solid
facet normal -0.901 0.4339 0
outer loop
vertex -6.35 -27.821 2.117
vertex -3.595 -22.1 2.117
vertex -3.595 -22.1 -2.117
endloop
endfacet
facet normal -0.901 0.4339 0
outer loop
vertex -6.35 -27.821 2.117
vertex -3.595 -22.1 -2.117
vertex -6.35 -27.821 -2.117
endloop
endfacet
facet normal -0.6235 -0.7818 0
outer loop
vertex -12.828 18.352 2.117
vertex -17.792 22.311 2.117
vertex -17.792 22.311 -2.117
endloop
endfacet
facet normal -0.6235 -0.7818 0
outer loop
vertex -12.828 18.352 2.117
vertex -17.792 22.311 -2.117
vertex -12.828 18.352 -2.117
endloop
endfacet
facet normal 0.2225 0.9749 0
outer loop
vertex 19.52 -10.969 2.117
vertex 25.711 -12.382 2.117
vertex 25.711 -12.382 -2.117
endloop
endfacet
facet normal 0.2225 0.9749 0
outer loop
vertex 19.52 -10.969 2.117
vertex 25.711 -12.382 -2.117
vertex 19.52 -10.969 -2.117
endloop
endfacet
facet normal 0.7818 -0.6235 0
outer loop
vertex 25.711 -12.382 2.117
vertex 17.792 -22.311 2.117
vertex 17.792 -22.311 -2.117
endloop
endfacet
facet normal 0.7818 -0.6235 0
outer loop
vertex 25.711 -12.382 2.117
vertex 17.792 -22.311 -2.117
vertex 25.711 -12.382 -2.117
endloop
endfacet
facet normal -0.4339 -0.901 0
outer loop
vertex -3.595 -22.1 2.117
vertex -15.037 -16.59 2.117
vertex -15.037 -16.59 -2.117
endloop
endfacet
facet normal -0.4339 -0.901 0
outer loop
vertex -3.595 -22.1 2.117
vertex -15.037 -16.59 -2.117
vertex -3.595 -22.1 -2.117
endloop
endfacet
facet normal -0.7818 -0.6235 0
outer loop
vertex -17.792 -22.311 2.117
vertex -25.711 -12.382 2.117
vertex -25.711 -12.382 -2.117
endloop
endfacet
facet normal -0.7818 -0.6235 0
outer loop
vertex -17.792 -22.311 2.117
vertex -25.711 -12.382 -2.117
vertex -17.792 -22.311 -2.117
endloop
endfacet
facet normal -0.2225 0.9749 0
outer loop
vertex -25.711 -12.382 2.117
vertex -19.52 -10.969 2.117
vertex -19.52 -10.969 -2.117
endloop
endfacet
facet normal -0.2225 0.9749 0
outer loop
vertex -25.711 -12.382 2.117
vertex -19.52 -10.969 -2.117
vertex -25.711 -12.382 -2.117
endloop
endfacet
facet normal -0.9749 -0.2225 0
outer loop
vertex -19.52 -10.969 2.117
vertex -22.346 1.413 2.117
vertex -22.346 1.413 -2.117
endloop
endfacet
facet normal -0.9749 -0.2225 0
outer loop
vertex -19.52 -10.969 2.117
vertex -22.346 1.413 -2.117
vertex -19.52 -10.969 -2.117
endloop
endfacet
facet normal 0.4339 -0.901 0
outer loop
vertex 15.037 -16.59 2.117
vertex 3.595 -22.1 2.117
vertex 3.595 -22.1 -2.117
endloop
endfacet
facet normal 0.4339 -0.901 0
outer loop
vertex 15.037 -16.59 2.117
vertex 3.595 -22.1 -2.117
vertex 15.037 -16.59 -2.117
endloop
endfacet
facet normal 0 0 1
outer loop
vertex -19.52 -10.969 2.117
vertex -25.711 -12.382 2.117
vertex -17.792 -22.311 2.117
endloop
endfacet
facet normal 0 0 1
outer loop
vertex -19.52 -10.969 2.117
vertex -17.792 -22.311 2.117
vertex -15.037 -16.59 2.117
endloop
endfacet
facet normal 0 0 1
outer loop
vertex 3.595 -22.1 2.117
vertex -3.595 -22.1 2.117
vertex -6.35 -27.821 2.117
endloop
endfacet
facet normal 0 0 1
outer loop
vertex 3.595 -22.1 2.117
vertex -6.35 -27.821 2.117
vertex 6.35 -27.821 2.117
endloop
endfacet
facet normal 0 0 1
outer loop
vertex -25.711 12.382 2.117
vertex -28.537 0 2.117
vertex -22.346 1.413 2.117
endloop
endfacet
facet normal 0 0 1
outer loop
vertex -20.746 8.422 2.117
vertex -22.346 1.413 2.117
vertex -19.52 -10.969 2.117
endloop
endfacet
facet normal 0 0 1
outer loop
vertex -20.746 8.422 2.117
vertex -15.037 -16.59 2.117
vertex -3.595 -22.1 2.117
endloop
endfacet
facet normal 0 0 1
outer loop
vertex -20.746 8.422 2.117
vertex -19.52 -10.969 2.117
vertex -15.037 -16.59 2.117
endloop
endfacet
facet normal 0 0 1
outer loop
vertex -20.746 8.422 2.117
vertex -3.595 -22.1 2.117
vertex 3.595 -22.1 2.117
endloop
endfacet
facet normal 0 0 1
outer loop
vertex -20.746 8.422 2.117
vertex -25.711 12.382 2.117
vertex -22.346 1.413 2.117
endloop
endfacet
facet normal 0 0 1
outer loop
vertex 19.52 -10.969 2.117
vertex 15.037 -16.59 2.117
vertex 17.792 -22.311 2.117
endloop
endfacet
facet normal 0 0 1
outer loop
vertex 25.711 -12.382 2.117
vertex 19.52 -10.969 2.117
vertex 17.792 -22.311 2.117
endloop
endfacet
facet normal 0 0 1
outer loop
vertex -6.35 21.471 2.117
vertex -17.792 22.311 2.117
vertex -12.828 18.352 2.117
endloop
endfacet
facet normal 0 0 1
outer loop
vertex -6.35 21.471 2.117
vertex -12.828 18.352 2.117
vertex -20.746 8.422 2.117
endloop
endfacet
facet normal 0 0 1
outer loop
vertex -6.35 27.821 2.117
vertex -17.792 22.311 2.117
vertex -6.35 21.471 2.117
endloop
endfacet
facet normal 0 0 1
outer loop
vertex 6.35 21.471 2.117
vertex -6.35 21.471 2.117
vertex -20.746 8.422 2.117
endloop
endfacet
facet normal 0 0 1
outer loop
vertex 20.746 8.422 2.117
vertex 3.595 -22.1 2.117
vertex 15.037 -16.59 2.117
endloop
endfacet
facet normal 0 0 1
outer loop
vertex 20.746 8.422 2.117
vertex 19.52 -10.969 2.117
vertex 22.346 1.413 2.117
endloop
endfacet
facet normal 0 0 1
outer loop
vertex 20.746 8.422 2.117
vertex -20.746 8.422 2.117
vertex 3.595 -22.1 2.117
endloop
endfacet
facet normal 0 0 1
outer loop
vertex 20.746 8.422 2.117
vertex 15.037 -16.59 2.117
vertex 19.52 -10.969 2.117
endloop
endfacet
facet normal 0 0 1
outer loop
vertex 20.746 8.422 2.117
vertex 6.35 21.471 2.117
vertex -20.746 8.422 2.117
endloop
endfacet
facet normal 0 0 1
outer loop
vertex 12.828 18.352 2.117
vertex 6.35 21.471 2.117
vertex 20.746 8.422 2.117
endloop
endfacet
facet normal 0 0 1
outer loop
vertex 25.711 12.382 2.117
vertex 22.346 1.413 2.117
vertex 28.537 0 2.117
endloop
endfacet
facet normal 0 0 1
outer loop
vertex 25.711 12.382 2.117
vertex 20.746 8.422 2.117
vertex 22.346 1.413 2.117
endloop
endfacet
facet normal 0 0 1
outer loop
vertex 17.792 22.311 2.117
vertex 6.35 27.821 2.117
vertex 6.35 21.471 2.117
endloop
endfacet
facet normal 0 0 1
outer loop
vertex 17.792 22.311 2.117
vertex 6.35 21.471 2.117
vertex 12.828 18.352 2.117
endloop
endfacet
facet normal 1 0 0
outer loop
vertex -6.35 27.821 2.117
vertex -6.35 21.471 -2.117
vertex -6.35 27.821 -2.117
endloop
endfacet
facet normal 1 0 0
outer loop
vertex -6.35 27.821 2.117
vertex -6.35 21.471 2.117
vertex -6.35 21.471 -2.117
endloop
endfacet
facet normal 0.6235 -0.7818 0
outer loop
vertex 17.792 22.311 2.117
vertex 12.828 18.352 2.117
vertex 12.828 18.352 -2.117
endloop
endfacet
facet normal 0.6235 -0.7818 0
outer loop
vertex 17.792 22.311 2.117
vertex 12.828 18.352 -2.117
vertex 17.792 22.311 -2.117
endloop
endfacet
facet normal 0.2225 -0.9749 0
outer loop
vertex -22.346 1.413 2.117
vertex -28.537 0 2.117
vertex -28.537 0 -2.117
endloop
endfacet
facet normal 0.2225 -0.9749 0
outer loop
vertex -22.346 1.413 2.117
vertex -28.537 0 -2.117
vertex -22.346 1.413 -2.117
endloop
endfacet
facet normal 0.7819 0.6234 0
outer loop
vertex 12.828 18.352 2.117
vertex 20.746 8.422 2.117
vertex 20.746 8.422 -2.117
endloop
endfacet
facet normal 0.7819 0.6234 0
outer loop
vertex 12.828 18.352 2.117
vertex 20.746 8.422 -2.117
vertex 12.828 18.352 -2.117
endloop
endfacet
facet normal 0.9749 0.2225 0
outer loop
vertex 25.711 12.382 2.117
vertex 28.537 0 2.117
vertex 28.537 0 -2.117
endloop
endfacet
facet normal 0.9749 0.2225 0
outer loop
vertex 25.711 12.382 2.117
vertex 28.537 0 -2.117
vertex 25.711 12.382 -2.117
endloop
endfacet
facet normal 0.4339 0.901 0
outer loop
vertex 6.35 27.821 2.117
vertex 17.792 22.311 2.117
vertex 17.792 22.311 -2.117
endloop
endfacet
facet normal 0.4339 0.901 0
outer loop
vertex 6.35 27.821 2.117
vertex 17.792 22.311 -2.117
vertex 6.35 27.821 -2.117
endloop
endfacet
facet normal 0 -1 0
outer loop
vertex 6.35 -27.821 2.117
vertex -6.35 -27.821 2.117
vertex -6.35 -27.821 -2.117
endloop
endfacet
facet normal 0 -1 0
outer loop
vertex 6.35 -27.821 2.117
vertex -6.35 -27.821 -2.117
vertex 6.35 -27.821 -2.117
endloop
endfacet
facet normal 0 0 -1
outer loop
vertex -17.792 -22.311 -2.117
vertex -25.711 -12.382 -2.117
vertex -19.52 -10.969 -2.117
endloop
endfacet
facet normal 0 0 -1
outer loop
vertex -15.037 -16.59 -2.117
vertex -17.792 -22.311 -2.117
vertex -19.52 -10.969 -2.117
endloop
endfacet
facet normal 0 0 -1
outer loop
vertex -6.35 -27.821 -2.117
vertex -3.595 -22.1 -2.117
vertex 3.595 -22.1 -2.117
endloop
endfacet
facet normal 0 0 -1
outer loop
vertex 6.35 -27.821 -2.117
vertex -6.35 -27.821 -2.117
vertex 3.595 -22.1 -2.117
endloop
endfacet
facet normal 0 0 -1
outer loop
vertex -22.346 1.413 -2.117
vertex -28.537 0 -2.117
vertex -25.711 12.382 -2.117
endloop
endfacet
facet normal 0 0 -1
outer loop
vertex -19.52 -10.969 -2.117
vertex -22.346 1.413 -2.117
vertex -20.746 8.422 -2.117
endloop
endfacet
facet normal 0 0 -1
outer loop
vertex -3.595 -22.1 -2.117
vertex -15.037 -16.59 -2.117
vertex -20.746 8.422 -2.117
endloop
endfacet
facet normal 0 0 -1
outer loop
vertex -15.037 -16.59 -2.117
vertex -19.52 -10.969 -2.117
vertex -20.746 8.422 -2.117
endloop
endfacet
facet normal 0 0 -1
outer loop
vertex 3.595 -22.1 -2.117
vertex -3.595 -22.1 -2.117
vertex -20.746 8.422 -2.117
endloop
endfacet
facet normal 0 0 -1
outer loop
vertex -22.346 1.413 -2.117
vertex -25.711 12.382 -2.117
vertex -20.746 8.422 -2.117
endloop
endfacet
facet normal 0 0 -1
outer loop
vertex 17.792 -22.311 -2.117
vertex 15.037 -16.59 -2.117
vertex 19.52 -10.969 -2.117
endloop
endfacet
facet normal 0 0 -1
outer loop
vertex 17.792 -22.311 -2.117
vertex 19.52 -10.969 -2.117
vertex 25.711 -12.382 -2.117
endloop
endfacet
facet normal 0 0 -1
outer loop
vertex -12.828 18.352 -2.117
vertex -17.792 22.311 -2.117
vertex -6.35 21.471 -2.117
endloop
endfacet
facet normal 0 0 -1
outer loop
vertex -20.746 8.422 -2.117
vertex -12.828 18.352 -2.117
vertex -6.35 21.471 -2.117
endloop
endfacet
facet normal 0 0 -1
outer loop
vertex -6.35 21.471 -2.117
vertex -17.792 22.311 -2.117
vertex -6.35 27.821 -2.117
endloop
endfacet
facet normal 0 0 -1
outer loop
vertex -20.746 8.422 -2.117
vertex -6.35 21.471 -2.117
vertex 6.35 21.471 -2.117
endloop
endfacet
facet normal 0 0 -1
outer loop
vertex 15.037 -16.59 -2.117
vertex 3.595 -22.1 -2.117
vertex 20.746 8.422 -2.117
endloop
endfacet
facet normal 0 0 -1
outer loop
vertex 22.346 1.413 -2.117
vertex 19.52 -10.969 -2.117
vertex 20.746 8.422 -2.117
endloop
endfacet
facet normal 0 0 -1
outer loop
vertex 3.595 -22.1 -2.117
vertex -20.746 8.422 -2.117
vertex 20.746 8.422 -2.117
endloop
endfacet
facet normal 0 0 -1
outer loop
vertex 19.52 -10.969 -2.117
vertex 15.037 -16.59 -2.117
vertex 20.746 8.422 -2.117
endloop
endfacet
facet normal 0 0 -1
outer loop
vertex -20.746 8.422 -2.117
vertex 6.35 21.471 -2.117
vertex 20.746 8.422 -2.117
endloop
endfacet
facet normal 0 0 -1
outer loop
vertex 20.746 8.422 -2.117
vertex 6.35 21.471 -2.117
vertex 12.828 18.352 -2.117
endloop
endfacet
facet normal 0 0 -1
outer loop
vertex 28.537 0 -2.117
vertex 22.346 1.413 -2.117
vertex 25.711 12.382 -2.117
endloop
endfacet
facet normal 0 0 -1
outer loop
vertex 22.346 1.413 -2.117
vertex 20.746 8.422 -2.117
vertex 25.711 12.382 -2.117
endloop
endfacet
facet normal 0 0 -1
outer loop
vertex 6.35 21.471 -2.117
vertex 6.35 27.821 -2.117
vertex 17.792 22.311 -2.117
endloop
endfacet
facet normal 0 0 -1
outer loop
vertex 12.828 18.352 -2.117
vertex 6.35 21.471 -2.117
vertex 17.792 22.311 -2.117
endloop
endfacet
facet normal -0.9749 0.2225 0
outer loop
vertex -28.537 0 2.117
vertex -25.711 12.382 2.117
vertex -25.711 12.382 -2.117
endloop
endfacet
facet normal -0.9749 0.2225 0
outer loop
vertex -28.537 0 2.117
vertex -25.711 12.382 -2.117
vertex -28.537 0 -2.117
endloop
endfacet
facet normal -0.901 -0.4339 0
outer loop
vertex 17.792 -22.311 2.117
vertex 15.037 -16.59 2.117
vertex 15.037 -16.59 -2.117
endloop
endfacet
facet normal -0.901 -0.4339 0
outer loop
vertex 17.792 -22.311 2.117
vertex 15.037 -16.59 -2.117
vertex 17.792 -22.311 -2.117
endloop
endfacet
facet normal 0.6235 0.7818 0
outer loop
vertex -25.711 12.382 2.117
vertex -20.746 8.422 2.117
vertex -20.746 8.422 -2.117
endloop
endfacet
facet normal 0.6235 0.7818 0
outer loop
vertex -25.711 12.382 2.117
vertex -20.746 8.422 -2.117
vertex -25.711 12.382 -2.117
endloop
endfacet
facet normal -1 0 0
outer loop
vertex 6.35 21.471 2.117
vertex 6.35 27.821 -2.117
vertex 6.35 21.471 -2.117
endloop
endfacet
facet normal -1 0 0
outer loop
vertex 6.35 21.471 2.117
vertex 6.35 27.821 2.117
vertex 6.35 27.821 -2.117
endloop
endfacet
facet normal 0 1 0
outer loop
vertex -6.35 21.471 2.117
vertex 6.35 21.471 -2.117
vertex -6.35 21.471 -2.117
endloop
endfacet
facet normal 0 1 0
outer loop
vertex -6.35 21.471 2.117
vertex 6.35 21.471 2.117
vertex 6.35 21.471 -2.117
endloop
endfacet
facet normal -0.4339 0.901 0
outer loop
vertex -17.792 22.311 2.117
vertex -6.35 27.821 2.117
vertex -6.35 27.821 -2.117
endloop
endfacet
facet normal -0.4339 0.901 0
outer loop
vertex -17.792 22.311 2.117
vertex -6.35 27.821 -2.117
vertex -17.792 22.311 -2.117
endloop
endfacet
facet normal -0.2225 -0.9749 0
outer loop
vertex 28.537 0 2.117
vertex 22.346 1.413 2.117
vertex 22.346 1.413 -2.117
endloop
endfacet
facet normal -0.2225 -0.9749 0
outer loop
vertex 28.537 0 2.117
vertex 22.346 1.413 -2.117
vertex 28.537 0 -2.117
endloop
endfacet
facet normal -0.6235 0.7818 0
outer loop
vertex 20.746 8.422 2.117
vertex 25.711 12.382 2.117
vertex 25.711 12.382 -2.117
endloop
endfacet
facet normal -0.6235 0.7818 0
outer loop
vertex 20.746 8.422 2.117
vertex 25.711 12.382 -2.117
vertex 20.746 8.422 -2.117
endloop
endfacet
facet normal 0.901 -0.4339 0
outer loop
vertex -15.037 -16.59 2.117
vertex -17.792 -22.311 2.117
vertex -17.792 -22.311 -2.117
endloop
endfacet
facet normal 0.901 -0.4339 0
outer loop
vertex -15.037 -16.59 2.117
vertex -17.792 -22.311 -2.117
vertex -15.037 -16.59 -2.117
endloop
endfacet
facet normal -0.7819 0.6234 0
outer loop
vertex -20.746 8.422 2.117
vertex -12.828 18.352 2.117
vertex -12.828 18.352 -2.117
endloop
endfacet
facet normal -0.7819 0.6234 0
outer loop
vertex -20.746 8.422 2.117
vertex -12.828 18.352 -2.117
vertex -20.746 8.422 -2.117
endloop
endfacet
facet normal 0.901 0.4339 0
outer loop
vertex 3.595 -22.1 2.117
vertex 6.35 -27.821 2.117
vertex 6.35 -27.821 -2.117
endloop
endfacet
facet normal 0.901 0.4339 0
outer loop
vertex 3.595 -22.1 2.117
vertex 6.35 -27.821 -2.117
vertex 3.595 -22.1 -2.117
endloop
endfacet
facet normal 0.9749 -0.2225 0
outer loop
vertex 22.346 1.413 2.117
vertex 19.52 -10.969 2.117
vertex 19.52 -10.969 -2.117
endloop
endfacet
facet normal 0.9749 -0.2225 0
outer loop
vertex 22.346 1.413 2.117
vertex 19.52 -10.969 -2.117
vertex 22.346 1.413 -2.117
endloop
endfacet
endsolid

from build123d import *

# Parameters (mm, degrees)
F1_DEPTH = 2.116667


with BuildPart() as f1:
    # F0 (on Top) → F1 (new body, symmetric)
    with BuildSketch(Plane.XY):
        Polygon((-6.35, 21.471168), (-6.35, 27.821168), (-17.792305, 22.310844), (-12.827675, 18.351684), (-20.745995, 8.422424), (-25.710625, 12.381584), (-28.536641, 0), (-22.345849, 1.413008), (-19.519833, -10.968577), (-25.710625, -12.381584), (-17.792305, -22.310844), (-15.037143, -16.589692), (-3.594838, -22.100015), (-6.35, -27.821168), (6.35, -27.821168), (3.594838, -22.100015), (15.037143, -16.589692), (17.792305, -22.310844), (25.710625, -12.381584), (19.519833, -10.968577), (22.345849, 1.413008), (28.536641, 0), (25.710625, 12.381584), (20.745995, 8.422424), (12.827675, 18.351684), (17.792305, 22.310844), (6.35, 27.821168), (6.35, 21.471168), align=None)
    extrude(amount=F1_DEPTH, both=True)


solid = f1.part
